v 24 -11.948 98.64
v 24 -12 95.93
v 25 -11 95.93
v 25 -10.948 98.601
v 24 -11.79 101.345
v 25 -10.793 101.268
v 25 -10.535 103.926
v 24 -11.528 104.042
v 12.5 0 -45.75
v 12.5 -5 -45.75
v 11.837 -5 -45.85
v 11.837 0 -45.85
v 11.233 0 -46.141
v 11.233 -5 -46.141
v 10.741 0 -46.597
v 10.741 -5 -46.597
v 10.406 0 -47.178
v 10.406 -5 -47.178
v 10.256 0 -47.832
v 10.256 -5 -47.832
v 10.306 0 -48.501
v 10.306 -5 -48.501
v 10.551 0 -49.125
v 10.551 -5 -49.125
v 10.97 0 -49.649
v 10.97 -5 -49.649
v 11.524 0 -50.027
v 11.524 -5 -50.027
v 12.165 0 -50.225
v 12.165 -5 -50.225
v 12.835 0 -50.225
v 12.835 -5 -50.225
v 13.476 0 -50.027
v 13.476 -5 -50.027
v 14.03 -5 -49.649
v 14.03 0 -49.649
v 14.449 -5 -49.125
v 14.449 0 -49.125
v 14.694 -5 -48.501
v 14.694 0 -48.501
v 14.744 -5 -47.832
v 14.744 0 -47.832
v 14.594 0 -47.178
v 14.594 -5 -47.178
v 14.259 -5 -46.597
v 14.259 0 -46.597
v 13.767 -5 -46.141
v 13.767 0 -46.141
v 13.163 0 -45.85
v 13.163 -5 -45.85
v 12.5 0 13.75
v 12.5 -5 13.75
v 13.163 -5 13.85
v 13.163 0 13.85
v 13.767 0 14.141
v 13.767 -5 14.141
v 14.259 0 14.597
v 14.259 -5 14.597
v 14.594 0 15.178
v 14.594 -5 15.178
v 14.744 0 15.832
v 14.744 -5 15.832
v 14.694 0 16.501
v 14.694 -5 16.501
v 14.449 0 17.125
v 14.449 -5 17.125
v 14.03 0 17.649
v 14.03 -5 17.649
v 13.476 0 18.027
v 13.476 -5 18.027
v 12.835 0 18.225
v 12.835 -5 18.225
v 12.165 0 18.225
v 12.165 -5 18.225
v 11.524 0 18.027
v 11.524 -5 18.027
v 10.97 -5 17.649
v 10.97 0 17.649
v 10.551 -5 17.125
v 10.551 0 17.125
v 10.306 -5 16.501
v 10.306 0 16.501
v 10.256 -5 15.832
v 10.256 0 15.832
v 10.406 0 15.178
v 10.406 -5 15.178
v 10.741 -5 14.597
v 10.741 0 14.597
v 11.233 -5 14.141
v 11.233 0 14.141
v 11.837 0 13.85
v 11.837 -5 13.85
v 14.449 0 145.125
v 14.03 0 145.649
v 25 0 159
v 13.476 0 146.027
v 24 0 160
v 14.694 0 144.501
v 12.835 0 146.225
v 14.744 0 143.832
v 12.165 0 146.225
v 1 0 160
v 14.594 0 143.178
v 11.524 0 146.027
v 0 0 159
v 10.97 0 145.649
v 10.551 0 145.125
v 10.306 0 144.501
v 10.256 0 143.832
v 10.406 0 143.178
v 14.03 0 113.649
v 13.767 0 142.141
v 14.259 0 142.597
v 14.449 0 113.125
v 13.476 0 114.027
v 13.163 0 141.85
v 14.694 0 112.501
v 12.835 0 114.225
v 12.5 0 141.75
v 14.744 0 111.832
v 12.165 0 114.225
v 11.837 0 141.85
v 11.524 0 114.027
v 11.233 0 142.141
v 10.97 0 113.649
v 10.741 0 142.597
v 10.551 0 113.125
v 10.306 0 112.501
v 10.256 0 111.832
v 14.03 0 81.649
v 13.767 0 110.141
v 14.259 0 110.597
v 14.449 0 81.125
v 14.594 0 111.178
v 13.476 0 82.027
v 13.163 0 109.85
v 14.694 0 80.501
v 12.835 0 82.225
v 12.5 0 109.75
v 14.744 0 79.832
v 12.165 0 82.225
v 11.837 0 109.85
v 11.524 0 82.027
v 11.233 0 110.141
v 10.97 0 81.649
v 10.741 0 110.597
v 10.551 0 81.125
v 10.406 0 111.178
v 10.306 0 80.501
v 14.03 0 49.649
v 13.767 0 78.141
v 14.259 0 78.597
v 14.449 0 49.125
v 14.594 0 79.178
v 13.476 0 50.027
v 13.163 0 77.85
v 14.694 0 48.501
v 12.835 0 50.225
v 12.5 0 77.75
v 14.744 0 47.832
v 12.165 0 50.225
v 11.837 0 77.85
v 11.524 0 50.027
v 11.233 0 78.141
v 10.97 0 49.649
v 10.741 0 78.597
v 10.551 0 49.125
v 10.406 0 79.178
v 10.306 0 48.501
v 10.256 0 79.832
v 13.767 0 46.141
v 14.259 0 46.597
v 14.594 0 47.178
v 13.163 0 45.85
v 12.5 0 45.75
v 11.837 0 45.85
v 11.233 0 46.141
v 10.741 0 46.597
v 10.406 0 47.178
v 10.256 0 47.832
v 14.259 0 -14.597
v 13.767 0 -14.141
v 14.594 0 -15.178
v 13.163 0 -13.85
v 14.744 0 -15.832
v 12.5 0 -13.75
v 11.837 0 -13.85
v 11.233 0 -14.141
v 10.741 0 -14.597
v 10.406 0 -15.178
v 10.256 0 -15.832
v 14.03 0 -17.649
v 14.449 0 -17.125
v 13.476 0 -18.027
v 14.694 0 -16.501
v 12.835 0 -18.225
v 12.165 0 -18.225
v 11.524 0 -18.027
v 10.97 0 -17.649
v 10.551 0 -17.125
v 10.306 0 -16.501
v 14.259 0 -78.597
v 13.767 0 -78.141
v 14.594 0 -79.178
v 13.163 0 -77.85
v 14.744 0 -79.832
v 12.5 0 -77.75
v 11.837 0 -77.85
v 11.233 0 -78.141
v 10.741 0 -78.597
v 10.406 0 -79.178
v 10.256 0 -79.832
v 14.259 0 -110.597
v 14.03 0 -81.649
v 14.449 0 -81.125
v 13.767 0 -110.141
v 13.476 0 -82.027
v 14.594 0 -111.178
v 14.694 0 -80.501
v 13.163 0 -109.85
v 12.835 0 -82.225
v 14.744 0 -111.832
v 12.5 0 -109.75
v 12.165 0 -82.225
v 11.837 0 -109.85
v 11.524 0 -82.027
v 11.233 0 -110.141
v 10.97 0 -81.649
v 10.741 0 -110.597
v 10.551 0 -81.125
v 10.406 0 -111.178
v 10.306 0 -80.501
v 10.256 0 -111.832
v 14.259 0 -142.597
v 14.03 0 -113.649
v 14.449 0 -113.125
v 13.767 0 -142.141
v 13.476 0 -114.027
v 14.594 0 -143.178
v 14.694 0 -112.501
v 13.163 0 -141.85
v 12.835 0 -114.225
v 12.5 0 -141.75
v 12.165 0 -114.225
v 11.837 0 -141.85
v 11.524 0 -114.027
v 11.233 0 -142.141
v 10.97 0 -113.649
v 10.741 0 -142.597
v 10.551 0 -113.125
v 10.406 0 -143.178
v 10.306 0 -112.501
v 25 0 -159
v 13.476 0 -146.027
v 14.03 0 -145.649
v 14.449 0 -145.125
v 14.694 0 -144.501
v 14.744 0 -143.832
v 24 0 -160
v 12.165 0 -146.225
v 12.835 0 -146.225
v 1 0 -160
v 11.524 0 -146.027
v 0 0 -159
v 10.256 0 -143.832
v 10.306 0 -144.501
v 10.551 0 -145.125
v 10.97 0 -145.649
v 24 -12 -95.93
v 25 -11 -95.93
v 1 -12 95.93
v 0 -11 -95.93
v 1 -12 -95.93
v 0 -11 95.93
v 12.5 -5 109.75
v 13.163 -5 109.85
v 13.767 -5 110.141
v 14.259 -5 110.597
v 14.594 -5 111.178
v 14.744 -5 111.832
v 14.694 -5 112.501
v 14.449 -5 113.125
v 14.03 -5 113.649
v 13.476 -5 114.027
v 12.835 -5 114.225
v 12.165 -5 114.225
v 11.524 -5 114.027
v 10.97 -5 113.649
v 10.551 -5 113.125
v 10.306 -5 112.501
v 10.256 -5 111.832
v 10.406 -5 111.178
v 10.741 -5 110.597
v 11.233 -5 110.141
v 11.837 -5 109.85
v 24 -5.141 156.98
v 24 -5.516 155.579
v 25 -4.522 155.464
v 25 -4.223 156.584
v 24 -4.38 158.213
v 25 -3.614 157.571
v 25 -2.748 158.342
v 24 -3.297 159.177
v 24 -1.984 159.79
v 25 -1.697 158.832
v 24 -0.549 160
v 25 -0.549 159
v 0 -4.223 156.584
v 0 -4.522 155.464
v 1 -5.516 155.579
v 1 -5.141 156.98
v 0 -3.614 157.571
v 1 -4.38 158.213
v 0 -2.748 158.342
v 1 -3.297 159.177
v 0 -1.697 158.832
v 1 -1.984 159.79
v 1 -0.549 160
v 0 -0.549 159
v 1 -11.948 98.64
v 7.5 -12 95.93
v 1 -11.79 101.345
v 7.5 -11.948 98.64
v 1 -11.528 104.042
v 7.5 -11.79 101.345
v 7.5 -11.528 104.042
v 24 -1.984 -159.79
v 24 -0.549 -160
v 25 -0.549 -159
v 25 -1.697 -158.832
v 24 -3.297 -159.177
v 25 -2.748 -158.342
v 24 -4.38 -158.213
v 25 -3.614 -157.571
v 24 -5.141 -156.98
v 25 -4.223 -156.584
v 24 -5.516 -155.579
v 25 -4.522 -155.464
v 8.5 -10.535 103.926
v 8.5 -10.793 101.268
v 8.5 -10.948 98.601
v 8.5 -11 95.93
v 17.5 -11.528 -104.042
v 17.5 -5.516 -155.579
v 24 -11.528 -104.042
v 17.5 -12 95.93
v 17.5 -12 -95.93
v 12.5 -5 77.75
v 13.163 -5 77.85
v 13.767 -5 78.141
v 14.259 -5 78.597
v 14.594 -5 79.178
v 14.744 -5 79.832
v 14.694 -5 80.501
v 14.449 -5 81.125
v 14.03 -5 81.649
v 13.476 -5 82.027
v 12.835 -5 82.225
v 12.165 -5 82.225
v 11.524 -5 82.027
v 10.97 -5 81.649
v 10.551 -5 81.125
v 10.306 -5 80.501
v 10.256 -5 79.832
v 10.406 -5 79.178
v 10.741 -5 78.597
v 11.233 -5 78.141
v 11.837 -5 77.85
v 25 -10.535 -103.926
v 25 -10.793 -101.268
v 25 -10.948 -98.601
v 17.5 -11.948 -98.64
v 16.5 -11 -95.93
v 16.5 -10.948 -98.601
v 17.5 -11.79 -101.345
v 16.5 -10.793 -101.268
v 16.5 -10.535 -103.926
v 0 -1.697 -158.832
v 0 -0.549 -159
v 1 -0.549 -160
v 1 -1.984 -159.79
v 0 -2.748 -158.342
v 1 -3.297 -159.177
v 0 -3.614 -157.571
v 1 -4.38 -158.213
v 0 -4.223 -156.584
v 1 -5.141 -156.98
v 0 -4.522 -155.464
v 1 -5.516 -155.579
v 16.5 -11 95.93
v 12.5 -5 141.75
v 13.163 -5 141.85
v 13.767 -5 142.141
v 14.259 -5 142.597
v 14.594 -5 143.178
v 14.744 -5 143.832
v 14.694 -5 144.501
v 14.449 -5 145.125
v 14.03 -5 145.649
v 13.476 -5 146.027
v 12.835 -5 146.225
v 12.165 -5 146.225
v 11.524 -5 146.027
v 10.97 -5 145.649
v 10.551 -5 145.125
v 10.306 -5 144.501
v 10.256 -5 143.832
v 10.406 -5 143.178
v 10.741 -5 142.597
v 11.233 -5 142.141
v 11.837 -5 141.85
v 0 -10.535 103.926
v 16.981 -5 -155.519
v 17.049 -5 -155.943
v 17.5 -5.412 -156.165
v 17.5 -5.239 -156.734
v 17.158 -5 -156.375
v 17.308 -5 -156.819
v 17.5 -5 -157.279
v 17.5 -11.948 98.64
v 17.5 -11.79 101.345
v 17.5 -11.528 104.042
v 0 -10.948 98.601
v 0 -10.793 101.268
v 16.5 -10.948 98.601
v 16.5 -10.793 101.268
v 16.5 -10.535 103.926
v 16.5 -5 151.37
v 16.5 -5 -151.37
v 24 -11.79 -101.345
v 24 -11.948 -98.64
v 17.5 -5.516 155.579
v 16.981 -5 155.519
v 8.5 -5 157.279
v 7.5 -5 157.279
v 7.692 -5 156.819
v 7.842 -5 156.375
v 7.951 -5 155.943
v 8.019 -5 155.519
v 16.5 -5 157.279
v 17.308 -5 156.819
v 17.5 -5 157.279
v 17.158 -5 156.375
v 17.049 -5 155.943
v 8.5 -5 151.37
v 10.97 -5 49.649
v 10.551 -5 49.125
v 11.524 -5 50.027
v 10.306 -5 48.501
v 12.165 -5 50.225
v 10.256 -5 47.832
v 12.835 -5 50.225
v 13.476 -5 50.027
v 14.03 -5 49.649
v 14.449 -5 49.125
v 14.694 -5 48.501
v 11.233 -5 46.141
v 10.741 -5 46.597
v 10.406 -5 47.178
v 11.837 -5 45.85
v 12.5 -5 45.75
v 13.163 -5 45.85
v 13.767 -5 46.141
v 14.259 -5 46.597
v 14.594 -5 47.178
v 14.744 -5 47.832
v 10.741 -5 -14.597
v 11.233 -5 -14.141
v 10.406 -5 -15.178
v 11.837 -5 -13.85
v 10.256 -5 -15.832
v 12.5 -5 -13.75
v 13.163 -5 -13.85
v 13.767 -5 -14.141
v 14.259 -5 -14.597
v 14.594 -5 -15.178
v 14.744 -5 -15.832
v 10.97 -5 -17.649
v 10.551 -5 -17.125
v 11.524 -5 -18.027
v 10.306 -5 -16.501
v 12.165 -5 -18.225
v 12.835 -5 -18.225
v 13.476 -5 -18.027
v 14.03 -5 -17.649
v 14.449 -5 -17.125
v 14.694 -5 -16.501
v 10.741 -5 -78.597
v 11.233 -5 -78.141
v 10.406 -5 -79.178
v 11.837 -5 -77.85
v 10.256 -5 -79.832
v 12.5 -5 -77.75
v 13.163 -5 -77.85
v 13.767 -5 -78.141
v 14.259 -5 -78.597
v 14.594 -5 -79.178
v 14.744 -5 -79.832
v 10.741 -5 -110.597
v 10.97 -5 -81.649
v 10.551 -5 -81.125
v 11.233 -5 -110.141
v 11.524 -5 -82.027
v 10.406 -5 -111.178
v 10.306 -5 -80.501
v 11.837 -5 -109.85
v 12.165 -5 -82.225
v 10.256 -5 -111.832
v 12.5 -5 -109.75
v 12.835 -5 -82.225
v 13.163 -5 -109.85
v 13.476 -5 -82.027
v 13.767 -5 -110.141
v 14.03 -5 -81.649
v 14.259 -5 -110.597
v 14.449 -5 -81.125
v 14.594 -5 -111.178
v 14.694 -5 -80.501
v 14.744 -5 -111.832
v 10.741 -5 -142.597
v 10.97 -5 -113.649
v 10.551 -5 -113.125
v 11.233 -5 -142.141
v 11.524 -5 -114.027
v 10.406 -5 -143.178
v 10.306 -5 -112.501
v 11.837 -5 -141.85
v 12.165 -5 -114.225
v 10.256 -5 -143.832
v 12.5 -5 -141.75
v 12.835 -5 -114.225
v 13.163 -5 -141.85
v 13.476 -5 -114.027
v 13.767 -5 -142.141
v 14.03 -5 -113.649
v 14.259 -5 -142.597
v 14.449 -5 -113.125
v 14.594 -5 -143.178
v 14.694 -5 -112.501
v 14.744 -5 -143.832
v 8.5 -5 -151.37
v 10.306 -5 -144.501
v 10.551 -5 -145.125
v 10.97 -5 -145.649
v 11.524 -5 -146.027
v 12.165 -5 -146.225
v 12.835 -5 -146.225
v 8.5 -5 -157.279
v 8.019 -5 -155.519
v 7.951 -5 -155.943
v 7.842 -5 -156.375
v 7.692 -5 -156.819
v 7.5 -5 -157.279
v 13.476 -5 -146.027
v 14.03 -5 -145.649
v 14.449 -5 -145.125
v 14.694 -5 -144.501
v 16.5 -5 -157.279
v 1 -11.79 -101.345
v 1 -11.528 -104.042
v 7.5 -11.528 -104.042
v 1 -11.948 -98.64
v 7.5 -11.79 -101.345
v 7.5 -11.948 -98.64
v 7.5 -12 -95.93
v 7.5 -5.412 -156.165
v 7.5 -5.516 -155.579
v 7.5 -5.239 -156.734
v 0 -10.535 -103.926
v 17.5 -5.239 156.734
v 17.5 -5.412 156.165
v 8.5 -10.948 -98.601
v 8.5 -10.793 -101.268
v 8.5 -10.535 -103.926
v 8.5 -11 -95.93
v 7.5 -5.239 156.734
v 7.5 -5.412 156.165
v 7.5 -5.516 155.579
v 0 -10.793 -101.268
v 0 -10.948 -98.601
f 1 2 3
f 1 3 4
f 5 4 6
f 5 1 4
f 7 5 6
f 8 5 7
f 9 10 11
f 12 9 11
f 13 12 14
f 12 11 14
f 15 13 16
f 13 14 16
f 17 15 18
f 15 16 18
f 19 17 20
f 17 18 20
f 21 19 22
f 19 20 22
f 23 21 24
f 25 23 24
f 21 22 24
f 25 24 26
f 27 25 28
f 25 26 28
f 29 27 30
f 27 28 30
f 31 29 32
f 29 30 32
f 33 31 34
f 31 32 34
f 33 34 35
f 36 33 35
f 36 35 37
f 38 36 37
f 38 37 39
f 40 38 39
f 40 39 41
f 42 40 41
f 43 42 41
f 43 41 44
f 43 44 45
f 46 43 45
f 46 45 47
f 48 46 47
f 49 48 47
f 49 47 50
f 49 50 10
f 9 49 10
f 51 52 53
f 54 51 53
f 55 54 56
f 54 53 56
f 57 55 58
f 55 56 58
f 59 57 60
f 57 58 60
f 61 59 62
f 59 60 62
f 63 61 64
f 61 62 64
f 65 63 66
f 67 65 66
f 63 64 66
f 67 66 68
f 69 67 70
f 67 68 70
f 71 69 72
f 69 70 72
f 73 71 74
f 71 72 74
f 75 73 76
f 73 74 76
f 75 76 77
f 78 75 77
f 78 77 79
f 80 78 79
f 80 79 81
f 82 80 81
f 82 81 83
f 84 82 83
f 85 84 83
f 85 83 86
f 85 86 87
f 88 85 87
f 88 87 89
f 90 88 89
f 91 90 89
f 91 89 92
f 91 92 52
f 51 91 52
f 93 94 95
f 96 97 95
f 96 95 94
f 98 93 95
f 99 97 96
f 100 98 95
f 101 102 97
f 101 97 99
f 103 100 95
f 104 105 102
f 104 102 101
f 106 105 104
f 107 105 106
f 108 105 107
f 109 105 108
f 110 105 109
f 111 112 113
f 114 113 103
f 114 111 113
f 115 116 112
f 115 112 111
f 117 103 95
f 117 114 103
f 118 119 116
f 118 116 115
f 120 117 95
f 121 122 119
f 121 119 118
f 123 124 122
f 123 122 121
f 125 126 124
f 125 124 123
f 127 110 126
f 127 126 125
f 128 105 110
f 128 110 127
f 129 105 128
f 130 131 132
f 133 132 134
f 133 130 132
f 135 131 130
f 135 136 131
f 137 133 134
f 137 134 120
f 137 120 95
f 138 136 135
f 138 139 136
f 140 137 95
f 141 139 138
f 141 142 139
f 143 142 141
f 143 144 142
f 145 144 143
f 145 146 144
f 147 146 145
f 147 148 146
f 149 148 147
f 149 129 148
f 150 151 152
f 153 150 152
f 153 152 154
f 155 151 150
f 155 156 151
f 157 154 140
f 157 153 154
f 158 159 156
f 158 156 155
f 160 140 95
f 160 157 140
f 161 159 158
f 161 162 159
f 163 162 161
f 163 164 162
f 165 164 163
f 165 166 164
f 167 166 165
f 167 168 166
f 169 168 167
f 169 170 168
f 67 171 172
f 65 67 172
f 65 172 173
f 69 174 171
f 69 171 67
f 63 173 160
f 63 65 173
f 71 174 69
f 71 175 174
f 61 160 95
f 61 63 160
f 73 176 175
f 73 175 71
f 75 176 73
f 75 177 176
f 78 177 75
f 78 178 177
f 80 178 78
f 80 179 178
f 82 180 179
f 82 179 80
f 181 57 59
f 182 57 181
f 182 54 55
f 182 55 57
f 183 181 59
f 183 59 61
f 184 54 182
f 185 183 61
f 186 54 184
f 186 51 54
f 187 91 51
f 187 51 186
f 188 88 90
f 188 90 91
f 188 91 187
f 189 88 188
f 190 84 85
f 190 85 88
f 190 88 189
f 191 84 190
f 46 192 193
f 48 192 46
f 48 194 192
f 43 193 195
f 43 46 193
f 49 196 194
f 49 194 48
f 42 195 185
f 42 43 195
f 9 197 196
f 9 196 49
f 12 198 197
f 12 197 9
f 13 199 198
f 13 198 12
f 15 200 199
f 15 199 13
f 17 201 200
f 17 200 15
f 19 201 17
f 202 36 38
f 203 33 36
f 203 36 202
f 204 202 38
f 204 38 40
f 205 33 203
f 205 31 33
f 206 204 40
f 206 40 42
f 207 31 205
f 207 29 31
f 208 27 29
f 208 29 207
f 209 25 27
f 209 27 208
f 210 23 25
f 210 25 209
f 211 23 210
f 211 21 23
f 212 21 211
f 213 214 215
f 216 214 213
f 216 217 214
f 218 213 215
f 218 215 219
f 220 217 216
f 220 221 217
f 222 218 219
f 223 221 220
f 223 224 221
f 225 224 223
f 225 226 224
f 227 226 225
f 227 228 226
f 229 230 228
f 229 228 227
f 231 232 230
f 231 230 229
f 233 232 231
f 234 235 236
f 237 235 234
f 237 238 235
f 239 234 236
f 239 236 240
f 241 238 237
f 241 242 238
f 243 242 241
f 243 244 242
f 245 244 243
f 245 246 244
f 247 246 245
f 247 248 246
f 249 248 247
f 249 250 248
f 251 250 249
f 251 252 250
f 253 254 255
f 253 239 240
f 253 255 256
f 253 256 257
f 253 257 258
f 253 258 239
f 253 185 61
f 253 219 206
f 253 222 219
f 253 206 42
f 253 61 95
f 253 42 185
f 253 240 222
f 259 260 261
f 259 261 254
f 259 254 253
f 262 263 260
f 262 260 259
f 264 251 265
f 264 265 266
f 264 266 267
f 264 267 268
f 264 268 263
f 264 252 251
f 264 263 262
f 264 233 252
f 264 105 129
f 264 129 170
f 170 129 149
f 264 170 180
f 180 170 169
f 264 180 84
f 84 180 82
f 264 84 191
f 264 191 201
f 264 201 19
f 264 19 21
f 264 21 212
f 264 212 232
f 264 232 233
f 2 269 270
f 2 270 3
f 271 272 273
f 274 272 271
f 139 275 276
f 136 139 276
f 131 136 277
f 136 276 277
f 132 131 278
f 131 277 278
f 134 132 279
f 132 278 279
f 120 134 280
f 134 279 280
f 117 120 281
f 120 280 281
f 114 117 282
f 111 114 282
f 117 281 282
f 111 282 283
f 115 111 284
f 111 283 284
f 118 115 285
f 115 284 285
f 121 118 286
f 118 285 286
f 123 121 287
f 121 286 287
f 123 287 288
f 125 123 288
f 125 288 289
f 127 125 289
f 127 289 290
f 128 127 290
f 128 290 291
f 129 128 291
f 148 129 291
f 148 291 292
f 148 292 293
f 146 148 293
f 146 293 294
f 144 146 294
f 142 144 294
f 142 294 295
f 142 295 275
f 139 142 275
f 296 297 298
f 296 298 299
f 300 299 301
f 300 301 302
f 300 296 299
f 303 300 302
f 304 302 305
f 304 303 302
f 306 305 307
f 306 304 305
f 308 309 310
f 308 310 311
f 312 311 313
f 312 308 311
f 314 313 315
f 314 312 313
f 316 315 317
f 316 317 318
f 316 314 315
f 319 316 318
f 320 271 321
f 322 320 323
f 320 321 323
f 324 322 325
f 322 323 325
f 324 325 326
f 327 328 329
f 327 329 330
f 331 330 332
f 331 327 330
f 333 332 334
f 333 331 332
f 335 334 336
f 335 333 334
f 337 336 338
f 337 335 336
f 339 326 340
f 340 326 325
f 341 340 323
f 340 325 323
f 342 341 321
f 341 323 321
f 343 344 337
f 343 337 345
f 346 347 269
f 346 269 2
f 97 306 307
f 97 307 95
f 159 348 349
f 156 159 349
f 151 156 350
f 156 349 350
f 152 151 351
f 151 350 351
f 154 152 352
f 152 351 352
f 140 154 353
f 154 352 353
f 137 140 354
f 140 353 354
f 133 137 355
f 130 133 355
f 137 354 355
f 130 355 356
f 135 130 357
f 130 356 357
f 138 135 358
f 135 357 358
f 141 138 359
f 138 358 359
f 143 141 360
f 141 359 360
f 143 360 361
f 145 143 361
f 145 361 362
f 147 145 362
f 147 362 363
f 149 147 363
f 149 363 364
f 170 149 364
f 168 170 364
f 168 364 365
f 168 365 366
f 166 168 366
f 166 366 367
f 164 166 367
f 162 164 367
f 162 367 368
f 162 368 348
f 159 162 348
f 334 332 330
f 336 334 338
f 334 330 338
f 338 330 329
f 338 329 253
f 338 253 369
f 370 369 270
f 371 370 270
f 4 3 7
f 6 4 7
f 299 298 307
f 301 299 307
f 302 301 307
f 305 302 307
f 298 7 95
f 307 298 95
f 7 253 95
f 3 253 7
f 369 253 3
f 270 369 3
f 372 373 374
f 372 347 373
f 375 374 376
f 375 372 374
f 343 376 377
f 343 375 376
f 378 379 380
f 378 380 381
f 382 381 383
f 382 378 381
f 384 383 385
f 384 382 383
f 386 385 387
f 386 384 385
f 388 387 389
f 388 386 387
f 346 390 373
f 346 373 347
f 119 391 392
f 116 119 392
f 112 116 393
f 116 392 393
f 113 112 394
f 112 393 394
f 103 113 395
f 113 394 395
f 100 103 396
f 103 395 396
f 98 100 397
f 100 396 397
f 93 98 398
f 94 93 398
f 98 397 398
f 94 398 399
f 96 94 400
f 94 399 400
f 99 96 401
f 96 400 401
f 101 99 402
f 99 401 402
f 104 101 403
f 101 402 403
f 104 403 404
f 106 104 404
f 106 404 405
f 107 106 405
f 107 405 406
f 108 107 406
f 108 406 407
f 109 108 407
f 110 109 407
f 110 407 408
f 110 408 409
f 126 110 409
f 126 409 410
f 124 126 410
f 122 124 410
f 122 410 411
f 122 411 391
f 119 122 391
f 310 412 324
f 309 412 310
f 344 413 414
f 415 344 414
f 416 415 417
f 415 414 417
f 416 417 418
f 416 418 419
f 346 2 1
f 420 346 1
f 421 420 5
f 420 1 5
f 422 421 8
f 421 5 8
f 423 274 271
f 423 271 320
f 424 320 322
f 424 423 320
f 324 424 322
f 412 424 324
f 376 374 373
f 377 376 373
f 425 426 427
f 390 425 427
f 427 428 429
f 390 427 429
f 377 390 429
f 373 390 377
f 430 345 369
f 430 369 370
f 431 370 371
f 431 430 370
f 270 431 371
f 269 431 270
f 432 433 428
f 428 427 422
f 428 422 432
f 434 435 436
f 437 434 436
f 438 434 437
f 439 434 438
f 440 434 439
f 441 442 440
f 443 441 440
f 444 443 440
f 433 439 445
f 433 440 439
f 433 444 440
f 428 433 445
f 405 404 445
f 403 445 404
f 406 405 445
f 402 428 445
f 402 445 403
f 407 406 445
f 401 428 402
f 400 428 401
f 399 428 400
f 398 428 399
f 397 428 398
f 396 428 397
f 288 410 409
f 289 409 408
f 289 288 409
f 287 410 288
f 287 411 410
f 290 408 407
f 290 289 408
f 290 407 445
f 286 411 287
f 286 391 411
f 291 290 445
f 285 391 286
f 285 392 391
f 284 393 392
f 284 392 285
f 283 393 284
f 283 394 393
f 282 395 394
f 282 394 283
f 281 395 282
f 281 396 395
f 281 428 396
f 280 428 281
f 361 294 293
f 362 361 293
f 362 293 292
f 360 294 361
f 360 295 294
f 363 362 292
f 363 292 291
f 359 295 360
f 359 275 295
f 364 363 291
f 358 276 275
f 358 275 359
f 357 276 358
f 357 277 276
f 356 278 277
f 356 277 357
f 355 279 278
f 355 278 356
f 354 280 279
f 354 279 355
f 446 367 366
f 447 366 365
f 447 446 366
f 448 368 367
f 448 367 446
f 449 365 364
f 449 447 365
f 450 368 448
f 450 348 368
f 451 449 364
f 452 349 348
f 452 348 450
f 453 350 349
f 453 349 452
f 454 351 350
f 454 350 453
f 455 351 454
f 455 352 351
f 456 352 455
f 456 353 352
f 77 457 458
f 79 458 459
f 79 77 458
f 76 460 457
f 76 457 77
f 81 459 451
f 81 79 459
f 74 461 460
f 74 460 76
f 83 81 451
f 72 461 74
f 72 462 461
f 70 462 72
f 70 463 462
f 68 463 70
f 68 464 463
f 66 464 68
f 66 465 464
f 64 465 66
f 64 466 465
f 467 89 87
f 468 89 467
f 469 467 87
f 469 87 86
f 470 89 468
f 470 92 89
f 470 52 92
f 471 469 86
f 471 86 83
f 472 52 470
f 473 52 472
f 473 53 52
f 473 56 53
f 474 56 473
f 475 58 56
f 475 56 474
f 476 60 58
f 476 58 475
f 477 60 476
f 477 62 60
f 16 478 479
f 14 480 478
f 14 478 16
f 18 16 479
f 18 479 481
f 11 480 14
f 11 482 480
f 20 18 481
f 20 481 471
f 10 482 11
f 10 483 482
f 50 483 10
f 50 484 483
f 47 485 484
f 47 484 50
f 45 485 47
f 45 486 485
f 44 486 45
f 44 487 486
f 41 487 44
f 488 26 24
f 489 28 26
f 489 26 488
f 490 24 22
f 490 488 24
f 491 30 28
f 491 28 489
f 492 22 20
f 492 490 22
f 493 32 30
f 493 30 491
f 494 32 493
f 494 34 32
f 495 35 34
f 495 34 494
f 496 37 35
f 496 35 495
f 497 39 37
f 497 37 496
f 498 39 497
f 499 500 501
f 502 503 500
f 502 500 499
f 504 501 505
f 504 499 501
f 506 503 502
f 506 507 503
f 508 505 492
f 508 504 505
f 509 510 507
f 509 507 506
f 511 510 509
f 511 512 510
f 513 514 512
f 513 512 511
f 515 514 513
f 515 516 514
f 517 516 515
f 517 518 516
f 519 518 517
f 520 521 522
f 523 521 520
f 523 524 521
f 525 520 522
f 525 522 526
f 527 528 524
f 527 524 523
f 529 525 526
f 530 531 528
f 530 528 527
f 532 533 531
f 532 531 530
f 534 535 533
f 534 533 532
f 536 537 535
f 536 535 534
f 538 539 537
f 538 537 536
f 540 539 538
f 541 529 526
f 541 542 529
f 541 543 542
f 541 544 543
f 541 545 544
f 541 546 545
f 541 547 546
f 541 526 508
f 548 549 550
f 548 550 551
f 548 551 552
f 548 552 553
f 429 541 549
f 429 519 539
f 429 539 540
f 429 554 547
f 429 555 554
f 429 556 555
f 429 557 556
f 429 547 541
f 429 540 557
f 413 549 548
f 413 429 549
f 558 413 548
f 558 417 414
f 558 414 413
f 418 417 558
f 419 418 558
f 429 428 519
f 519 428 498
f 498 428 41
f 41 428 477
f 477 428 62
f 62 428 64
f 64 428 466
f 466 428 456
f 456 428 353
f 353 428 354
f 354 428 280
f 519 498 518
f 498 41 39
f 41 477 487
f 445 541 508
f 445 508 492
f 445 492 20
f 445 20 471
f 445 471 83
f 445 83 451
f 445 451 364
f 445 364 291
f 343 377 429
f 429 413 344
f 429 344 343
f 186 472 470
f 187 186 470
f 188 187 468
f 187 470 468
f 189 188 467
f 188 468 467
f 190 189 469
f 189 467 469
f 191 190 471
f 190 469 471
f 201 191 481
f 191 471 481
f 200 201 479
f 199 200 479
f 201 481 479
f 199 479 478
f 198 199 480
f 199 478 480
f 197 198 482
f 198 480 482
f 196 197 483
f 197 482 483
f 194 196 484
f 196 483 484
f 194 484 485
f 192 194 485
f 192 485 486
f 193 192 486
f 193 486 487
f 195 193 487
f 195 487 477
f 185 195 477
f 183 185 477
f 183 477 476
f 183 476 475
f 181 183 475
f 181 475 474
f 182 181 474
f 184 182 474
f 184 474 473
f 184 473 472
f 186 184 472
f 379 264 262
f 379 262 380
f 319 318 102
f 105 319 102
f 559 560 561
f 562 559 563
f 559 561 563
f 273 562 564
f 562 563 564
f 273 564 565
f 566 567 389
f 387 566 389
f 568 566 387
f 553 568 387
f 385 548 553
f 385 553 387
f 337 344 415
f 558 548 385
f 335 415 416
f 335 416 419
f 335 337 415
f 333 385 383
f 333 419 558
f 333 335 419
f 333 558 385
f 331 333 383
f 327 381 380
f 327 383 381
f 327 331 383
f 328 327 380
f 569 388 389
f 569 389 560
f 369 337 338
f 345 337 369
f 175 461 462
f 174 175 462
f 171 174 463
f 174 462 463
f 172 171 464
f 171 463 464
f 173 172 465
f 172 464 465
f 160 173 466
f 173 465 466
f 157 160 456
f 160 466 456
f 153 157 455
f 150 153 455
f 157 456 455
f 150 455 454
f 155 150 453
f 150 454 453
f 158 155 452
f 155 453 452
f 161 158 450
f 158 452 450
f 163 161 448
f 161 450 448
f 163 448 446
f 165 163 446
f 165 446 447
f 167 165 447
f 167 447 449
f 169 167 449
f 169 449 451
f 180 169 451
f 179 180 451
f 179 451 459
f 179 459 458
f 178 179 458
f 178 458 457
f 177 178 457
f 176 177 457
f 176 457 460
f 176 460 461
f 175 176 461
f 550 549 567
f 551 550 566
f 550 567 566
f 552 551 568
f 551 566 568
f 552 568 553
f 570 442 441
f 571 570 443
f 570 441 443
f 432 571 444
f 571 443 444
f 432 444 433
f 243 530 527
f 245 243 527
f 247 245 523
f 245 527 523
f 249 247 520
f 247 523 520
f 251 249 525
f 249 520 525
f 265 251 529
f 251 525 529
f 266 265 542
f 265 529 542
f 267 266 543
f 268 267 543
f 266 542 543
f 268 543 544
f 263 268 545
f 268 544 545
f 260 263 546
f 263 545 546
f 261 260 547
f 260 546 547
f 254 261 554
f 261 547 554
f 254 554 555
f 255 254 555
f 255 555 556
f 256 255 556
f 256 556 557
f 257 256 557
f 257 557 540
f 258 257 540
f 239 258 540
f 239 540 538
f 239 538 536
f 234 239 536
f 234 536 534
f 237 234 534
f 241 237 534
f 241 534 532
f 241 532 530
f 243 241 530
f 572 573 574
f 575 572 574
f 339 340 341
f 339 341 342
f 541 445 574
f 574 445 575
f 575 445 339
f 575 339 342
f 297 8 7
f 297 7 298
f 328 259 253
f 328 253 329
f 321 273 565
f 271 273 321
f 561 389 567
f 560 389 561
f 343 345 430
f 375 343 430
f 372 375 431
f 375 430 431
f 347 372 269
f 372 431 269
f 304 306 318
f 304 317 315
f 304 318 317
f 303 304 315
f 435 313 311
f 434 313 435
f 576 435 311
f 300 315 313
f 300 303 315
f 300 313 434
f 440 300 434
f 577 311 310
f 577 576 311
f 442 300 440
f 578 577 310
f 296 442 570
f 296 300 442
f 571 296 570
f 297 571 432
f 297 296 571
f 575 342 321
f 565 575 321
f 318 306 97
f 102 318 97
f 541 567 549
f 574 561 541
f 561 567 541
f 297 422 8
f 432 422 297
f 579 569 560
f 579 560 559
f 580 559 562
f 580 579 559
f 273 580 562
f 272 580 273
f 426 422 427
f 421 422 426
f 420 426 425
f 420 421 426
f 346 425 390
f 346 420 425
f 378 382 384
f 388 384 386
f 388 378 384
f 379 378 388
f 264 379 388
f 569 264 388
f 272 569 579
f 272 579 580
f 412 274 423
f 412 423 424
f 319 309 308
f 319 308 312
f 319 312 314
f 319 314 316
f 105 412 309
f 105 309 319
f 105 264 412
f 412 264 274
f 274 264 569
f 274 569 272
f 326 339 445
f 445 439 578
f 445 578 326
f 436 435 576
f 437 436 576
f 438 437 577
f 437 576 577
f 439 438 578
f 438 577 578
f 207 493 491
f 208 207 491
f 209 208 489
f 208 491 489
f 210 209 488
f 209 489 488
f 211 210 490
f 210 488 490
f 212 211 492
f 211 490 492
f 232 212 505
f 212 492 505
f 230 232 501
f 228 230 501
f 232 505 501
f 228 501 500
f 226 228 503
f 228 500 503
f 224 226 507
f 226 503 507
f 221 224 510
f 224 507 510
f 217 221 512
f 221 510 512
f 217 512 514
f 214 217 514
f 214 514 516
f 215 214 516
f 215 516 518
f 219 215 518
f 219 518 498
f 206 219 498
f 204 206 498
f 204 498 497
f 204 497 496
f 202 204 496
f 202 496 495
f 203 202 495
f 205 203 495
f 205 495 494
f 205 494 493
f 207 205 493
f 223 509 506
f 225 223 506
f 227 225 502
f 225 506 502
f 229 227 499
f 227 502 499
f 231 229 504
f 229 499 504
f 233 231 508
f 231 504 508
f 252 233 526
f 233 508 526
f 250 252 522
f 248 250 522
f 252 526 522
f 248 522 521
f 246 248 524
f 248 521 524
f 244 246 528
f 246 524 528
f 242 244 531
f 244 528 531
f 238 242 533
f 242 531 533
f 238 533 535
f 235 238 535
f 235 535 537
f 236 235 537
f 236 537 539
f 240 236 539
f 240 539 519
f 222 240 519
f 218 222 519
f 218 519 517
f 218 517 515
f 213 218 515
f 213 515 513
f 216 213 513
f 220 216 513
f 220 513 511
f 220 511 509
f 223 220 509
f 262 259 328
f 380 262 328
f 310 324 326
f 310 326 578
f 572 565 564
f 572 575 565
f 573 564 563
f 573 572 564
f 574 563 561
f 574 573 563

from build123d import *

# Parameters (mm, degrees)
BOSS_EXTRUDE1_DEPTH = 25
FILLET1_R           = 70
FILLET2_R           = 5
CHAMFER1_SIZE       = 1
SKETCH2_R           = 2.25
CUT_EXTRUDE1_DEPTH  = 163.385344166
SKETCH5_W           = 8
SKETCH5_H           = 7
CUT_EXTRUDE2_DEPTH  = 322.199315068
CHAMFER2_SIZE       = 1


with BuildPart() as part:
    # Sketch1 → Boss-Extrude1 (new body)
    with BuildSketch(Plane(origin=(0, 0, 0), x_dir=(0, 0, -1), z_dir=(1, 0, 0))):
        Polygon((-160, 0), (160, 0), (160, -5), (100, -12), (-100, -12), (-160, -5), align=None)
    extrude(amount=BOSS_EXTRUDE1_DEPTH)

    # Fillet1
    fillet1_edges = [part.edges().sort_by_distance(p)[0] for p in [
        (12.5, -12, -100),
        (12.5, -12, 100),
    ]]
    fillet(fillet1_edges, radius=FILLET1_R)

    # Fillet2
    fillet2_edges = [part.edges().sort_by_distance(p)[0] for p in [
        (12.5, -5, -160),
        (12.5, -5, 160),
    ]]
    fillet(fillet2_edges, radius=FILLET2_R)

    # Chamfer1
    chamfer1_edges = [part.edges().sort_by_distance(p)[0] for p in [
        (25, -0.274710282, 160),
        (0, -8.522077997, -129.810760023),
        (25, -8.522077997, -129.810760023),
        (0, -12, 0),
        (0, -11.882005486, 99.99314025),
        (0, -11.882005486, -99.99314025),
        (25, -12, 0),
        (25, -11.882005486, 99.99314025),
        (25, -11.882005486, -99.99314025),
        (0, -0.274710282, -160),
        (25, -0.274710282, -160),
        (0, -8.522077997, 129.810760023),
        (0, -3.873798889, 158.73477024),
        (0, -3.873798889, -158.73477024),
        (25, -8.522077997, 129.810760023),
        (25, -3.873798889, 158.73477024),
        (25, -3.873798889, -158.73477024),
        (0, -0.274710282, 160),
    ]]
    chamfer(chamfer1_edges, length=CHAMFER1_SIZE)

    # Sketch2 → Cut-Extrude1 (cut, through all)
    with BuildSketch(Plane.XZ.offset(12)):
        with Locations(Location((12.5, 144, 0), (0, 0, 270))):
            Circle(SKETCH2_R)
        with Locations(Location((12.5, 112, 0), (0, 0, 270))):
            Circle(SKETCH2_R)
        with Locations(Location((12.5, 48, 0), (0, 0, 270))):
            Circle(SKETCH2_R)
        with Locations(Location((12.5, 80, 0), (0, 0, 270))):
            Circle(SKETCH2_R)
        with Locations(Location((12.5, -80, 0), (0, 0, 90))):
            Circle(SKETCH2_R)
        with Locations(Location((12.5, -48, 0), (0, 0, 90))):
            Circle(SKETCH2_R)
        with Locations(Location((12.5, -112, 0), (0, 0, 90))):
            Circle(SKETCH2_R)
        with Locations(Location((12.5, -144, 0), (0, 0, 90))):
            Circle(SKETCH2_R)
        with Locations(Location((12.5, 16, 0), (0, 0, 270))):
            Circle(SKETCH2_R)
        with Locations(Location((12.5, -16, 0), (0, 0, 90))):
            Circle(SKETCH2_R)
    extrude(amount=-CUT_EXTRUDE1_DEPTH, mode=Mode.SUBTRACT)

    # Sketch5 → Cut-Extrude2 (cut, through all)
    with BuildSketch(Plane.XY.offset(160)):
        with Locations((12.5, -8.5)):
            Rectangle(SKETCH5_W, SKETCH5_H)
    extrude(amount=-CUT_EXTRUDE2_DEPTH, mode=Mode.SUBTRACT)

    # Chamfer2
    # the kernel refuses this chamfer: 1 mm, written as the material it takes off along each edge
    with BuildSketch(Plane(origin=(16.5, -0.549420563, 155), x_dir=(0, -0.5507413136369002, 0.8346759883053434), z_dir=(0, 0.8346759883053434, 0.5507413136369002))) as chamfer2_piece_1_section:
        Polygon((5, CHAMFER2_SIZE), (5 - CHAMFER2_SIZE, 0), (5, 0), align=None)
    chamfer2_piece_1 = revolve(axis=Axis((16.5, -0.549420563, 155), (1, 0, 0)), revolution_arc=49.927689897, mode=Mode.PRIVATE)
    chamfer2_piece_1 = split(chamfer2_piece_1, bisect_by=Plane(origin=(16.914516826, -5, 156.211106637), z_dir=(0, -1, 0)), keep=Keep.TOP, mode=Mode.PRIVATE)
    add(chamfer2_piece_1, mode=Mode.SUBTRACT)
    with BuildSketch(Plane(origin=(8.5, -0.549420563, 155), x_dir=(0, -0.5507413136369004, 0.8346759883053431), z_dir=(0, 0.8346759883053431, 0.5507413136369004))) as chamfer2_piece_2_section:
        Polygon((5 - CHAMFER2_SIZE, 0), (5, -CHAMFER2_SIZE), (5, 0), align=None)
    chamfer2_piece_2 = revolve(axis=Axis((8.5, -0.549420563, 155), (1, 0, 0)), revolution_arc=49.927689897, mode=Mode.PRIVATE)
    chamfer2_piece_2 = split(chamfer2_piece_2, bisect_by=Plane(origin=(8.085483174, -5, 156.211106637), z_dir=(0, -1, 0)), keep=Keep.TOP, mode=Mode.PRIVATE)
    add(chamfer2_piece_2, mode=Mode.SUBTRACT)
    with BuildSketch(Plane(origin=(8.5, 58, -95.930467578), x_dir=(0, -1, 0), z_dir=(0, 0, 1))) as chamfer2_piece_3:
        Polygon((70, -CHAMFER2_SIZE), (70 - CHAMFER2_SIZE, 0), (70, 0), align=None)
    revolve(axis=Axis((8.5, 58, -95.930467578), (1, 0, 0)), revolution_arc=6.654425046, mode=Mode.SUBTRACT)
    with BuildSketch(Plane(origin=(8.5, -0.549420563, -155), x_dir=(0, -0.9932631390872432, -0.11588069956017648), z_dir=(0, -0.11588069956017648, 0.9932631390872432))) as chamfer2_piece_4_section:
        Polygon((5 - CHAMFER2_SIZE, 0), (5, -CHAMFER2_SIZE), (5, 0), align=None)
    chamfer2_piece_4 = revolve(axis=Axis((8.5, -0.549420563, -155), (1, 0, 0)), revolution_arc=49.927689897, mode=Mode.PRIVATE)
    chamfer2_piece_4 = split(chamfer2_piece_4, bisect_by=Plane(origin=(8.085483174, -5, -156.211106637), z_dir=(0, -1, 0)), keep=Keep.TOP, mode=Mode.PRIVATE)
    add(chamfer2_piece_4, mode=Mode.SUBTRACT)
    with BuildSketch(Plane(origin=(8.5, 58, 95.930467578), x_dir=(0, -0.9932631390872428, 0.11588069956017871), z_dir=(0, 0.11588069956017871, 0.9932631390872428))) as chamfer2_piece_5:
        Polygon((70 - CHAMFER2_SIZE, 0), (70, -CHAMFER2_SIZE), (70, 0), align=None)
    revolve(axis=Axis((8.5, 58, 95.930467578), (1, 0, 0)), revolution_arc=6.654425046, mode=Mode.SUBTRACT)
    with BuildSketch(Plane(origin=(16.5, 58, -95.930467578), x_dir=(0, -1, 0), z_dir=(0, 0, 1))) as chamfer2_piece_6:
        Polygon((70 - CHAMFER2_SIZE, 0), (70, CHAMFER2_SIZE), (70, 0), align=None)
    revolve(axis=Axis((16.5, 58, -95.930467578), (1, 0, 0)), revolution_arc=6.654425046, mode=Mode.SUBTRACT)
    with BuildSketch(Plane(origin=(16.5, -0.549420563, -155), x_dir=(0, -0.9932631390872432, -0.11588069956017648), z_dir=(0, -0.11588069956017648, 0.9932631390872432))) as chamfer2_piece_7_section:
        Polygon((5, CHAMFER2_SIZE), (5 - CHAMFER2_SIZE, 0), (5, 0), align=None)
    chamfer2_piece_7 = revolve(axis=Axis((16.5, -0.549420563, -155), (1, 0, 0)), revolution_arc=49.927689897, mode=Mode.PRIVATE)
    chamfer2_piece_7 = split(chamfer2_piece_7, bisect_by=Plane(origin=(16.914516826, -5, -156.211106637), z_dir=(0, -1, 0)), keep=Keep.TOP, mode=Mode.PRIVATE)
    add(chamfer2_piece_7, mode=Mode.SUBTRACT)
    with BuildSketch(Plane(origin=(16.5, 58, 95.930467578), x_dir=(0, -0.9932631390872428, 0.11588069956017871), z_dir=(0, 0.11588069956017871, 0.9932631390872428))) as chamfer2_piece_8:
        Polygon((70 - CHAMFER2_SIZE, 0), (70, CHAMFER2_SIZE), (70, 0), align=None)
    revolve(axis=Axis((16.5, 58, 95.930467578), (1, 0, 0)), revolution_arc=6.654425046, mode=Mode.SUBTRACT)
    with BuildSketch(Plane(origin=(16.5, -12, 95.930467578), x_dir=(-0.0274958766105891, 0.9996219169112968, 0), z_dir=(0, 0, -1))) as chamfer2_piece_9:
        Polygon((CHAMFER2_SIZE * 0.999621916911, CHAMFER2_SIZE * 0.0274958766106), (-CHAMFER2_SIZE * 0.0274958766106, CHAMFER2_SIZE * 0.999621916911), (0, 0), align=None)
    extrude(amount=191.860935157, mode=Mode.SUBTRACT)
    with BuildSketch(Plane(origin=(8.5, -12, 95.930467578), x_dir=(0.02749587661058392, 0.9996219169112968, 0), z_dir=(0, 0, -1))) as chamfer2_piece_10:
        Polygon((CHAMFER2_SIZE * 0.999621916911, -CHAMFER2_SIZE * 0.0274958766106), (-CHAMFER2_SIZE * 0.0274958766106, -CHAMFER2_SIZE * 0.999621916911), (0, 0), align=None)
    extrude(amount=191.860935157, mode=Mode.SUBTRACT)
    with BuildSketch(Plane(origin=(8.5, -5.515736259, 155.579403498), x_dir=(0.02749587661058567, 0.9928876030917217, -0.11583688702736752), z_dir=(0, -0.11588069956017834, -0.993263139087243))) as chamfer2_piece_11_section:
        Polygon((CHAMFER2_SIZE * 0.999621916911, -CHAMFER2_SIZE * 0.0274958766106), (-CHAMFER2_SIZE * 0.0274958766106, -CHAMFER2_SIZE * 0.999621916911), (0, 0), align=None)
    chamfer2_piece_11 = extrude(amount=51.886841384, mode=Mode.PRIVATE)
    chamfer2_piece_11 = split(chamfer2_piece_11, bisect_by=Plane(origin=(8.17503416, -5, 154.587318638), z_dir=(0, -1, 0)), keep=Keep.TOP, mode=Mode.PRIVATE)
    add(chamfer2_piece_11, mode=Mode.SUBTRACT)
    with BuildSketch(Plane(origin=(8.5, -11.528419736, -104.042116548), x_dir=(-0.9996219169112968, -0.027310640714189302, -0.0031862414166552175), z_dir=(0, 0.11588069956017857, -0.993263139087243))) as chamfer2_piece_12_section:
        Polygon((CHAMFER2_SIZE * 0.999621916911, CHAMFER2_SIZE * 0.0274958766106), (-CHAMFER2_SIZE * 0.0274958766106, CHAMFER2_SIZE * 0.999621916911), (0, 0), align=None)
    chamfer2_piece_12 = extrude(amount=51.886841384, mode=Mode.PRIVATE)
    chamfer2_piece_12 = split(chamfer2_piece_12, bisect_by=Plane(origin=(8.158054196, -5, -132.007867246), z_dir=(0, -1, 0)), keep=Keep.TOP, mode=Mode.PRIVATE)
    add(chamfer2_piece_12, mode=Mode.SUBTRACT)
    with BuildSketch(Plane(origin=(16.5, -5.515736259, -155.579403498), x_dir=(-0.027495876610589238, 0.9928876030917216, 0.11583688702736777), z_dir=(0, -0.11588069956017857, 0.993263139087243))) as chamfer2_piece_13_section:
        Polygon((CHAMFER2_SIZE * 0.999621916911, -CHAMFER2_SIZE * 0.0274958766106), (-CHAMFER2_SIZE * 0.0274958766106, -CHAMFER2_SIZE * 0.999621916911), (0, 0), align=None)
    chamfer2_piece_13 = extrude(amount=51.886841384, mode=Mode.PRIVATE)
    chamfer2_piece_13 = split(chamfer2_piece_13, bisect_by=Plane(origin=(16.82496584, -5, -154.587318638), z_dir=(0, -1, 0)), keep=Keep.TOP, mode=Mode.PRIVATE)
    add(chamfer2_piece_13, mode=Mode.SUBTRACT)
    with BuildSketch(Plane(origin=(16.5, -11.528419736, 104.042116548), x_dir=(-0.02749587661058908, 0.9928876030917217, -0.11583688702736755), z_dir=(0, 0.11588069956017834, 0.993263139087243))) as chamfer2_piece_14_section:
        Polygon((CHAMFER2_SIZE * 0.999621916911, -CHAMFER2_SIZE * 0.0274958766106), (-CHAMFER2_SIZE * 0.0274958766106, -CHAMFER2_SIZE * 0.999621916911), (0, 0), align=None)
    chamfer2_piece_14 = extrude(amount=51.886841384, mode=Mode.PRIVATE)
    chamfer2_piece_14 = split(chamfer2_piece_14, bisect_by=Plane(origin=(16.785811772, -5, 107.657614918), z_dir=(0, -1, 0)), keep=Keep.TOP, mode=Mode.PRIVATE)
    add(chamfer2_piece_14, mode=Mode.SUBTRACT)


solid = part.part
